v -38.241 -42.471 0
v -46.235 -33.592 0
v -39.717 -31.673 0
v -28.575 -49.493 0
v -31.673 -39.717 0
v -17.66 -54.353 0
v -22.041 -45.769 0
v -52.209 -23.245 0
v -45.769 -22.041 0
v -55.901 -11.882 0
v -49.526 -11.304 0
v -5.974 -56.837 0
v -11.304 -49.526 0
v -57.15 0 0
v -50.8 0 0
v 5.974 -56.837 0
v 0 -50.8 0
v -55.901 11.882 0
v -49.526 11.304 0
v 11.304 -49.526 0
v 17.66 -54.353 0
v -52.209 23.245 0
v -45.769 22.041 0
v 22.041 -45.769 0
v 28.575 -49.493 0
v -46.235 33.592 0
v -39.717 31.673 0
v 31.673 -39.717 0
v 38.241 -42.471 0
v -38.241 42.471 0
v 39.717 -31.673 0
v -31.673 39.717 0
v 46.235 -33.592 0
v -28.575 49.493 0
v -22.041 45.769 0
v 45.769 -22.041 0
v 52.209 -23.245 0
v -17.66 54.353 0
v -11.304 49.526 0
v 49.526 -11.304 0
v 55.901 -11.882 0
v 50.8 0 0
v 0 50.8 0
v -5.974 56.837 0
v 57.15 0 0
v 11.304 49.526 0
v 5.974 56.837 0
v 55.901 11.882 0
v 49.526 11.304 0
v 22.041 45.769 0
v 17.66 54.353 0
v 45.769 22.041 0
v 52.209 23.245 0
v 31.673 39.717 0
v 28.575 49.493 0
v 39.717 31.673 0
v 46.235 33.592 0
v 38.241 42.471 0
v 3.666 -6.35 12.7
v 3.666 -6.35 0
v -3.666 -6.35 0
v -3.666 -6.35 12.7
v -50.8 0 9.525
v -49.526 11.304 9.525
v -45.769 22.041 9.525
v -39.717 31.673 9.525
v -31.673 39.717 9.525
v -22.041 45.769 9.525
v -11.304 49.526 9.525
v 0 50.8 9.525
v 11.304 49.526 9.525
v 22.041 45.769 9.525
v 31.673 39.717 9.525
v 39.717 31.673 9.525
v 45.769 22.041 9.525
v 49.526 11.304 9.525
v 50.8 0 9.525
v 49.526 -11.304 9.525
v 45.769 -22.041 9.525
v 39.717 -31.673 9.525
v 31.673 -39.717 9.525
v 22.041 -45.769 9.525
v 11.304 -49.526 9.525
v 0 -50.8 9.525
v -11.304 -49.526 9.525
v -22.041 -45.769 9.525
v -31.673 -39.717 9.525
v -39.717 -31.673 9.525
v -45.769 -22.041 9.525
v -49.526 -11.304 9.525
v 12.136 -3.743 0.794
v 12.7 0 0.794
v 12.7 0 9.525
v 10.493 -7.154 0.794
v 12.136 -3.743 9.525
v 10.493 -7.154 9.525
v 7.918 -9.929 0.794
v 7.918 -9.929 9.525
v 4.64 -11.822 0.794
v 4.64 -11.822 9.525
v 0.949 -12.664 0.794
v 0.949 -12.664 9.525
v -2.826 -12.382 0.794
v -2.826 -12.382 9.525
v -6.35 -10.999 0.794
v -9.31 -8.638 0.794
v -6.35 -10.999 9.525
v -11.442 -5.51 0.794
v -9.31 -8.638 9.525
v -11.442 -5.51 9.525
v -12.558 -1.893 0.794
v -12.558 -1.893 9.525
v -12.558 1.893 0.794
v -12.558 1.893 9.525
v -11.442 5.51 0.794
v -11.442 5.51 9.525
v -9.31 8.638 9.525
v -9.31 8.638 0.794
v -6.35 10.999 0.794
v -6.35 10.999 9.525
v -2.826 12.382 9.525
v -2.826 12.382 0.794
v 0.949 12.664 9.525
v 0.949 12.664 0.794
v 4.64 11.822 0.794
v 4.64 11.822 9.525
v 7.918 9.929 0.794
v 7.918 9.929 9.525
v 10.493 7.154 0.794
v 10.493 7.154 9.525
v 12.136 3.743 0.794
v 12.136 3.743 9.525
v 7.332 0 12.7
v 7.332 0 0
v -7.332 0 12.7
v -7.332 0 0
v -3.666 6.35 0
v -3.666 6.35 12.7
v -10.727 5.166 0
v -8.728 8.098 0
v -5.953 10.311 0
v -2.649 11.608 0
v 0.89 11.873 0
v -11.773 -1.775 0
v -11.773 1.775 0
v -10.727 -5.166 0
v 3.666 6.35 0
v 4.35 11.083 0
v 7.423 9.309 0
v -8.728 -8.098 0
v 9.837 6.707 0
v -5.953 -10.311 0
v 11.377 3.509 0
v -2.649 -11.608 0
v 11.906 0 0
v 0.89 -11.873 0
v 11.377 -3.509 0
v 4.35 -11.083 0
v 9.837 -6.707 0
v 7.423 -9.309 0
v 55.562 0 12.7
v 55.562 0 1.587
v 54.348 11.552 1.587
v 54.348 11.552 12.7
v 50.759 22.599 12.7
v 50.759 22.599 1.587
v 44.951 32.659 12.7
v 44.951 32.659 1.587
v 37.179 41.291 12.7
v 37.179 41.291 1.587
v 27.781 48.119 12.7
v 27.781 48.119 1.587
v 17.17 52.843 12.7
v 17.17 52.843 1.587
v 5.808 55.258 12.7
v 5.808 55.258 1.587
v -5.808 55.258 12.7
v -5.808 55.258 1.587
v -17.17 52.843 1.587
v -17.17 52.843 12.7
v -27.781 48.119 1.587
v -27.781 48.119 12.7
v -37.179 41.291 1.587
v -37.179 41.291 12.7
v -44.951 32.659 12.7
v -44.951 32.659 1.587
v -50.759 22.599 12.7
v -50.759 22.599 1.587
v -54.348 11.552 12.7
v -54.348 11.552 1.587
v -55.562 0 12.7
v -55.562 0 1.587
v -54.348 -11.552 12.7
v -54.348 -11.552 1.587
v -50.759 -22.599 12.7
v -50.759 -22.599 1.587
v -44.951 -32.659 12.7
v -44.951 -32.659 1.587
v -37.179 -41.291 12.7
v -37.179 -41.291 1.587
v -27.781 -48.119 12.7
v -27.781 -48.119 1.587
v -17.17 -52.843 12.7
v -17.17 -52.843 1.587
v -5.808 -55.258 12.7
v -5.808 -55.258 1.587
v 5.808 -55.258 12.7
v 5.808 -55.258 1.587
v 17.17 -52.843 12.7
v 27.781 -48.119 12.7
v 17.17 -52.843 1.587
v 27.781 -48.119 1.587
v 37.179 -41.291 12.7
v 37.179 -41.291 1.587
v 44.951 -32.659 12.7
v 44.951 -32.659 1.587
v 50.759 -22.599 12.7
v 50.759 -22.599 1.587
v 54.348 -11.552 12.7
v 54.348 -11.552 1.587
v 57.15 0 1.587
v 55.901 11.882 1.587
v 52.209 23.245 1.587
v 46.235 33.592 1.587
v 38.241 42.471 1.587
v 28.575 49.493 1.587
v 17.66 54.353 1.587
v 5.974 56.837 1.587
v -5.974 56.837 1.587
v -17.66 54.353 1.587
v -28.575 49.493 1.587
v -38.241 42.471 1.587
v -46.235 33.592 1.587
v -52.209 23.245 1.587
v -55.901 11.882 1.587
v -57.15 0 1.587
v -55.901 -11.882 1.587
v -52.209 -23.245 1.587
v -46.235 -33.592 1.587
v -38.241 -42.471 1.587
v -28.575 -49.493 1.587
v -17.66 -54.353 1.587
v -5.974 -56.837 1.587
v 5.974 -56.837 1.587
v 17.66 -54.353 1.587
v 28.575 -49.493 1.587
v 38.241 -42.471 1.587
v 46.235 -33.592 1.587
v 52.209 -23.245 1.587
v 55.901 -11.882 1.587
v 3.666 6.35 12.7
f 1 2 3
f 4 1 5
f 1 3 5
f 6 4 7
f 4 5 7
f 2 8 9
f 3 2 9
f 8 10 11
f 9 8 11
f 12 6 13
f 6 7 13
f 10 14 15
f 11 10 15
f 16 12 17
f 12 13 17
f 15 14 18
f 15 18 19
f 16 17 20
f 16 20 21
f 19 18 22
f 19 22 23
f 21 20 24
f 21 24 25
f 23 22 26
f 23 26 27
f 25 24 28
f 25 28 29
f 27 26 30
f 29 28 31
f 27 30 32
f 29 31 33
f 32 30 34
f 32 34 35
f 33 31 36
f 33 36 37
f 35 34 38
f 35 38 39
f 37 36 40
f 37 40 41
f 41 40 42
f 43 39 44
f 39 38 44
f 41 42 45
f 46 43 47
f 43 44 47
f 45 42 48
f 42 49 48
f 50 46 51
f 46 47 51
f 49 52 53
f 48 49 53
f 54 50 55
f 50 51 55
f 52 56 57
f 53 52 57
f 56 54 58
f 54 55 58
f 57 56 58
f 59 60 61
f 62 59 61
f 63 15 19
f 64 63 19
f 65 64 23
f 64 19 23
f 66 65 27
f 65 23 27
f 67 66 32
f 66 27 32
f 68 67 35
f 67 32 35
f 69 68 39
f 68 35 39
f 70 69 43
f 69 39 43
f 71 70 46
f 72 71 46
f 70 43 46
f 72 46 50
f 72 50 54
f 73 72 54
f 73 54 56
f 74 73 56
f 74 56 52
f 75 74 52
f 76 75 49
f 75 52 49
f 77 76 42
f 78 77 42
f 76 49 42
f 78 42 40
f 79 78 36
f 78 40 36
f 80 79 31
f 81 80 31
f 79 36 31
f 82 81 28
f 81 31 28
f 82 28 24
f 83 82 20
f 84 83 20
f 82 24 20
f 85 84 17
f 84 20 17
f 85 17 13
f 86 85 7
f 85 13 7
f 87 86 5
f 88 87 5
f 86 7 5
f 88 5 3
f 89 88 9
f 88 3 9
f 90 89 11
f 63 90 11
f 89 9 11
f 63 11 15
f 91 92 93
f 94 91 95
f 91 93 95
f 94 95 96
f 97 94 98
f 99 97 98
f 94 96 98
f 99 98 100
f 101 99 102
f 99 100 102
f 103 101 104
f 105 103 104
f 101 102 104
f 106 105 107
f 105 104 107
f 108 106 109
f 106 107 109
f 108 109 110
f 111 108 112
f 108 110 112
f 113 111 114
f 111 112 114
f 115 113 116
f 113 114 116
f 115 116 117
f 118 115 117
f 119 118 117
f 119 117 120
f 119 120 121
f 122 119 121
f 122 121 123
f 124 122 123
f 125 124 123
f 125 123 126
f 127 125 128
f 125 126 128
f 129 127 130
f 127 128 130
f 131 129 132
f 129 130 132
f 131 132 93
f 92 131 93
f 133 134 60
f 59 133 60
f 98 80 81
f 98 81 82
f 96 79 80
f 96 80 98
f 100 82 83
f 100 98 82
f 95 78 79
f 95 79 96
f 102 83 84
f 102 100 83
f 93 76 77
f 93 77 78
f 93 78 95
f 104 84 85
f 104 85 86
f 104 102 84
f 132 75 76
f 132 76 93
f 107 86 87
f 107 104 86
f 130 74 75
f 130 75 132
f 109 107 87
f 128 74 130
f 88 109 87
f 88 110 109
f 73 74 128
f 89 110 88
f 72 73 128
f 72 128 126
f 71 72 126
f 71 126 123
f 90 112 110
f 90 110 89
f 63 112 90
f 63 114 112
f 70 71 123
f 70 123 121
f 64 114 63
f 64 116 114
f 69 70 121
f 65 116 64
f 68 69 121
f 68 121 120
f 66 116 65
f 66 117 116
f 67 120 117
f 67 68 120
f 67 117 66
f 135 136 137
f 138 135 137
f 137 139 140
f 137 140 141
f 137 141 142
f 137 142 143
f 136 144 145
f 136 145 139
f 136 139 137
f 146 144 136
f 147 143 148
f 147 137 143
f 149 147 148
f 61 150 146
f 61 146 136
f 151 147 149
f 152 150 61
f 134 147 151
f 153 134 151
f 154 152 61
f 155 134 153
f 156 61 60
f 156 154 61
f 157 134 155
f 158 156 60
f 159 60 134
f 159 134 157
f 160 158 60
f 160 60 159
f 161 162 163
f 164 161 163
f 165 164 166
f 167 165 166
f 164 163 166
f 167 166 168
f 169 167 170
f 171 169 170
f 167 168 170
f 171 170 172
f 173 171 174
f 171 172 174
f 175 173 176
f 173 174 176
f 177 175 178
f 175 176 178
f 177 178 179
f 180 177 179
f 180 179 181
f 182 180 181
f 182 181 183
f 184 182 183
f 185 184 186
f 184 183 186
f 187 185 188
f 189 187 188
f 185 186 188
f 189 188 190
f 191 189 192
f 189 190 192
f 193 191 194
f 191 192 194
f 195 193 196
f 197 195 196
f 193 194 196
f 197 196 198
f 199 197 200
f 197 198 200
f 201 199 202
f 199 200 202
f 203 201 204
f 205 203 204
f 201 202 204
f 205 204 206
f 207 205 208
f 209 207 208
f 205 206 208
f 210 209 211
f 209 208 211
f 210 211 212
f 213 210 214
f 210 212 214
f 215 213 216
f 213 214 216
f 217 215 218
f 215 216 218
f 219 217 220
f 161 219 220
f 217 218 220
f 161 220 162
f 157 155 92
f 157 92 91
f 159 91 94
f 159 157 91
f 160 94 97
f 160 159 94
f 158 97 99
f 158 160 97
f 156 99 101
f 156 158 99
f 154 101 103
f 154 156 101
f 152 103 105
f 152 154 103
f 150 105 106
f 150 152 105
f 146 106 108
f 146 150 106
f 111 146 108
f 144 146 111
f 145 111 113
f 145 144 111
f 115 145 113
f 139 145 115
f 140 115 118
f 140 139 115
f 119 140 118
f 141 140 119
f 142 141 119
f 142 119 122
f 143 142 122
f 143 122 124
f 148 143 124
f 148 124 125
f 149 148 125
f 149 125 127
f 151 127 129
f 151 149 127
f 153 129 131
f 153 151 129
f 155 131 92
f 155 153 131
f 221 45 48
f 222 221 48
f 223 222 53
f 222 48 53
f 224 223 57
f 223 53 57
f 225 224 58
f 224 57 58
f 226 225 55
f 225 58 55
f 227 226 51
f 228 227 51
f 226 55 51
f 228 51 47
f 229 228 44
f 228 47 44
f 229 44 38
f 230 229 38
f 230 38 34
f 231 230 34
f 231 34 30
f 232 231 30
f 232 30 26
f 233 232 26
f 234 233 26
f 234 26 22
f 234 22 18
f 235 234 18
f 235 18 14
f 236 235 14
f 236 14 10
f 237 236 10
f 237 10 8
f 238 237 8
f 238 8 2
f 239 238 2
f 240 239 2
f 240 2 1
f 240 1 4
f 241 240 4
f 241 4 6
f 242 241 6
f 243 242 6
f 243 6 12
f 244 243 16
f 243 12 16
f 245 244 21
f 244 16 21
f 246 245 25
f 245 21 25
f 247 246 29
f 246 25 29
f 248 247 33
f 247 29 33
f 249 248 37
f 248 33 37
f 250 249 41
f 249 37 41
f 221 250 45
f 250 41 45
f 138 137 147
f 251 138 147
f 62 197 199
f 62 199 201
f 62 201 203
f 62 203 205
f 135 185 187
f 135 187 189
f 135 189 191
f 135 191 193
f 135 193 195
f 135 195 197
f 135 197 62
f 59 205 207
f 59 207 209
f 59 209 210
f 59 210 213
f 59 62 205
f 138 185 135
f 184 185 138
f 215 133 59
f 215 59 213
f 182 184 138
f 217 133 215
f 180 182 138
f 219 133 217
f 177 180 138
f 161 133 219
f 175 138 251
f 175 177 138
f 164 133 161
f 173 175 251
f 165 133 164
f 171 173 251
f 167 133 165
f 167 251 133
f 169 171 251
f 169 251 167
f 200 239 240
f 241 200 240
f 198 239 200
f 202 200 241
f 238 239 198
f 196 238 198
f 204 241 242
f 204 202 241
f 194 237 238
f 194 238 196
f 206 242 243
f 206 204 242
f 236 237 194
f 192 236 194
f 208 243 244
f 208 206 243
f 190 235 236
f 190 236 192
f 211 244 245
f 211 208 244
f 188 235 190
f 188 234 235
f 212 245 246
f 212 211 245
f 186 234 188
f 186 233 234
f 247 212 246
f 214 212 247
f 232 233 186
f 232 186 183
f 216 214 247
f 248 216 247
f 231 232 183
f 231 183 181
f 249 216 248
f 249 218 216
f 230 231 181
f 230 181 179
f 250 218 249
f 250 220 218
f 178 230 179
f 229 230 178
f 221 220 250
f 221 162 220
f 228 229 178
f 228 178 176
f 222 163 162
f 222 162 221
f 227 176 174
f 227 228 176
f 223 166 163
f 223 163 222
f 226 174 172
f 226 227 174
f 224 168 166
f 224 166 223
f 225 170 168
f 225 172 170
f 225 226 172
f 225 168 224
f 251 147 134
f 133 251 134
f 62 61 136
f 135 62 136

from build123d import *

# Parameters (mm, degrees)
SKETCH1_R           = 57.15
BOSS_EXTRUDE1_DEPTH = 12.7
CUT_EXTRUDE1_START  = -11.1125
SKETCH2_R           = 57.15
SKETCH2_R_2         = 55.5625
CUT_EXTRUDE1_DEPTH  = 11.1125
SKETCH3_R           = 50.8
CUT_EXTRUDE2_DEPTH  = 9.525
SKETCH4_R           = 12.7
BOSS_EXTRUDE2_DEPTH = 9.525
CUT_EXTRUDE4_DEPTH  = 12.7
CHAMFER1_SIZE       = 0.79375


with BuildPart() as part:
    # Sketch1 → Boss-Extrude1 (new body)
    with BuildSketch(Plane.XY):
        Circle(SKETCH1_R)
    extrude(amount=BOSS_EXTRUDE1_DEPTH)

    # Sketch2 → Cut-Extrude1 (cut)
    with BuildSketch(Plane.XY.offset(12.7).offset(CUT_EXTRUDE1_START)):
        Circle(SKETCH2_R)
        Circle(SKETCH2_R_2, mode=Mode.SUBTRACT)
    extrude(amount=CUT_EXTRUDE1_DEPTH, mode=Mode.SUBTRACT)

    # Sketch3 → Cut-Extrude2 (cut)
    with BuildSketch(Plane(origin=(0, 0, 0), x_dir=(-1, 0, 0), z_dir=(0, 0, -1))):
        Circle(SKETCH3_R)
    extrude(amount=-CUT_EXTRUDE2_DEPTH, mode=Mode.SUBTRACT)

    # Sketch4 → Boss-Extrude2 (add)
    with BuildSketch(Plane(origin=(0, 0, 9.525), x_dir=(-1, 0, 0), z_dir=(0, 0, -1))):
        with Locations(Location((0, 0, 0), (0, 0, 180))):
            Circle(SKETCH4_R)
    extrude(amount=BOSS_EXTRUDE2_DEPTH)

    # Sketch6 → Cut-Extrude4 (cut)
    with BuildSketch(Plane(origin=(0, 0, 0), x_dir=(-1, 0, 0), z_dir=(0, 0, -1))):
        Polygon((7.332348419, 0), (3.666174209, 6.35), (-3.666174209, 6.35), (-7.332348419, 0), (-3.666174209, -6.35), (3.666174209, -6.35), align=None)
    extrude(amount=-CUT_EXTRUDE4_DEPTH, mode=Mode.SUBTRACT)

    # Chamfer1
    chamfer1_edges = [part.edges().sort_by_distance(p)[0] for p in [
        (-12.7, 0, 0),
    ]]
    chamfer(chamfer1_edges, length=CHAMFER1_SIZE)


solid = part.part
